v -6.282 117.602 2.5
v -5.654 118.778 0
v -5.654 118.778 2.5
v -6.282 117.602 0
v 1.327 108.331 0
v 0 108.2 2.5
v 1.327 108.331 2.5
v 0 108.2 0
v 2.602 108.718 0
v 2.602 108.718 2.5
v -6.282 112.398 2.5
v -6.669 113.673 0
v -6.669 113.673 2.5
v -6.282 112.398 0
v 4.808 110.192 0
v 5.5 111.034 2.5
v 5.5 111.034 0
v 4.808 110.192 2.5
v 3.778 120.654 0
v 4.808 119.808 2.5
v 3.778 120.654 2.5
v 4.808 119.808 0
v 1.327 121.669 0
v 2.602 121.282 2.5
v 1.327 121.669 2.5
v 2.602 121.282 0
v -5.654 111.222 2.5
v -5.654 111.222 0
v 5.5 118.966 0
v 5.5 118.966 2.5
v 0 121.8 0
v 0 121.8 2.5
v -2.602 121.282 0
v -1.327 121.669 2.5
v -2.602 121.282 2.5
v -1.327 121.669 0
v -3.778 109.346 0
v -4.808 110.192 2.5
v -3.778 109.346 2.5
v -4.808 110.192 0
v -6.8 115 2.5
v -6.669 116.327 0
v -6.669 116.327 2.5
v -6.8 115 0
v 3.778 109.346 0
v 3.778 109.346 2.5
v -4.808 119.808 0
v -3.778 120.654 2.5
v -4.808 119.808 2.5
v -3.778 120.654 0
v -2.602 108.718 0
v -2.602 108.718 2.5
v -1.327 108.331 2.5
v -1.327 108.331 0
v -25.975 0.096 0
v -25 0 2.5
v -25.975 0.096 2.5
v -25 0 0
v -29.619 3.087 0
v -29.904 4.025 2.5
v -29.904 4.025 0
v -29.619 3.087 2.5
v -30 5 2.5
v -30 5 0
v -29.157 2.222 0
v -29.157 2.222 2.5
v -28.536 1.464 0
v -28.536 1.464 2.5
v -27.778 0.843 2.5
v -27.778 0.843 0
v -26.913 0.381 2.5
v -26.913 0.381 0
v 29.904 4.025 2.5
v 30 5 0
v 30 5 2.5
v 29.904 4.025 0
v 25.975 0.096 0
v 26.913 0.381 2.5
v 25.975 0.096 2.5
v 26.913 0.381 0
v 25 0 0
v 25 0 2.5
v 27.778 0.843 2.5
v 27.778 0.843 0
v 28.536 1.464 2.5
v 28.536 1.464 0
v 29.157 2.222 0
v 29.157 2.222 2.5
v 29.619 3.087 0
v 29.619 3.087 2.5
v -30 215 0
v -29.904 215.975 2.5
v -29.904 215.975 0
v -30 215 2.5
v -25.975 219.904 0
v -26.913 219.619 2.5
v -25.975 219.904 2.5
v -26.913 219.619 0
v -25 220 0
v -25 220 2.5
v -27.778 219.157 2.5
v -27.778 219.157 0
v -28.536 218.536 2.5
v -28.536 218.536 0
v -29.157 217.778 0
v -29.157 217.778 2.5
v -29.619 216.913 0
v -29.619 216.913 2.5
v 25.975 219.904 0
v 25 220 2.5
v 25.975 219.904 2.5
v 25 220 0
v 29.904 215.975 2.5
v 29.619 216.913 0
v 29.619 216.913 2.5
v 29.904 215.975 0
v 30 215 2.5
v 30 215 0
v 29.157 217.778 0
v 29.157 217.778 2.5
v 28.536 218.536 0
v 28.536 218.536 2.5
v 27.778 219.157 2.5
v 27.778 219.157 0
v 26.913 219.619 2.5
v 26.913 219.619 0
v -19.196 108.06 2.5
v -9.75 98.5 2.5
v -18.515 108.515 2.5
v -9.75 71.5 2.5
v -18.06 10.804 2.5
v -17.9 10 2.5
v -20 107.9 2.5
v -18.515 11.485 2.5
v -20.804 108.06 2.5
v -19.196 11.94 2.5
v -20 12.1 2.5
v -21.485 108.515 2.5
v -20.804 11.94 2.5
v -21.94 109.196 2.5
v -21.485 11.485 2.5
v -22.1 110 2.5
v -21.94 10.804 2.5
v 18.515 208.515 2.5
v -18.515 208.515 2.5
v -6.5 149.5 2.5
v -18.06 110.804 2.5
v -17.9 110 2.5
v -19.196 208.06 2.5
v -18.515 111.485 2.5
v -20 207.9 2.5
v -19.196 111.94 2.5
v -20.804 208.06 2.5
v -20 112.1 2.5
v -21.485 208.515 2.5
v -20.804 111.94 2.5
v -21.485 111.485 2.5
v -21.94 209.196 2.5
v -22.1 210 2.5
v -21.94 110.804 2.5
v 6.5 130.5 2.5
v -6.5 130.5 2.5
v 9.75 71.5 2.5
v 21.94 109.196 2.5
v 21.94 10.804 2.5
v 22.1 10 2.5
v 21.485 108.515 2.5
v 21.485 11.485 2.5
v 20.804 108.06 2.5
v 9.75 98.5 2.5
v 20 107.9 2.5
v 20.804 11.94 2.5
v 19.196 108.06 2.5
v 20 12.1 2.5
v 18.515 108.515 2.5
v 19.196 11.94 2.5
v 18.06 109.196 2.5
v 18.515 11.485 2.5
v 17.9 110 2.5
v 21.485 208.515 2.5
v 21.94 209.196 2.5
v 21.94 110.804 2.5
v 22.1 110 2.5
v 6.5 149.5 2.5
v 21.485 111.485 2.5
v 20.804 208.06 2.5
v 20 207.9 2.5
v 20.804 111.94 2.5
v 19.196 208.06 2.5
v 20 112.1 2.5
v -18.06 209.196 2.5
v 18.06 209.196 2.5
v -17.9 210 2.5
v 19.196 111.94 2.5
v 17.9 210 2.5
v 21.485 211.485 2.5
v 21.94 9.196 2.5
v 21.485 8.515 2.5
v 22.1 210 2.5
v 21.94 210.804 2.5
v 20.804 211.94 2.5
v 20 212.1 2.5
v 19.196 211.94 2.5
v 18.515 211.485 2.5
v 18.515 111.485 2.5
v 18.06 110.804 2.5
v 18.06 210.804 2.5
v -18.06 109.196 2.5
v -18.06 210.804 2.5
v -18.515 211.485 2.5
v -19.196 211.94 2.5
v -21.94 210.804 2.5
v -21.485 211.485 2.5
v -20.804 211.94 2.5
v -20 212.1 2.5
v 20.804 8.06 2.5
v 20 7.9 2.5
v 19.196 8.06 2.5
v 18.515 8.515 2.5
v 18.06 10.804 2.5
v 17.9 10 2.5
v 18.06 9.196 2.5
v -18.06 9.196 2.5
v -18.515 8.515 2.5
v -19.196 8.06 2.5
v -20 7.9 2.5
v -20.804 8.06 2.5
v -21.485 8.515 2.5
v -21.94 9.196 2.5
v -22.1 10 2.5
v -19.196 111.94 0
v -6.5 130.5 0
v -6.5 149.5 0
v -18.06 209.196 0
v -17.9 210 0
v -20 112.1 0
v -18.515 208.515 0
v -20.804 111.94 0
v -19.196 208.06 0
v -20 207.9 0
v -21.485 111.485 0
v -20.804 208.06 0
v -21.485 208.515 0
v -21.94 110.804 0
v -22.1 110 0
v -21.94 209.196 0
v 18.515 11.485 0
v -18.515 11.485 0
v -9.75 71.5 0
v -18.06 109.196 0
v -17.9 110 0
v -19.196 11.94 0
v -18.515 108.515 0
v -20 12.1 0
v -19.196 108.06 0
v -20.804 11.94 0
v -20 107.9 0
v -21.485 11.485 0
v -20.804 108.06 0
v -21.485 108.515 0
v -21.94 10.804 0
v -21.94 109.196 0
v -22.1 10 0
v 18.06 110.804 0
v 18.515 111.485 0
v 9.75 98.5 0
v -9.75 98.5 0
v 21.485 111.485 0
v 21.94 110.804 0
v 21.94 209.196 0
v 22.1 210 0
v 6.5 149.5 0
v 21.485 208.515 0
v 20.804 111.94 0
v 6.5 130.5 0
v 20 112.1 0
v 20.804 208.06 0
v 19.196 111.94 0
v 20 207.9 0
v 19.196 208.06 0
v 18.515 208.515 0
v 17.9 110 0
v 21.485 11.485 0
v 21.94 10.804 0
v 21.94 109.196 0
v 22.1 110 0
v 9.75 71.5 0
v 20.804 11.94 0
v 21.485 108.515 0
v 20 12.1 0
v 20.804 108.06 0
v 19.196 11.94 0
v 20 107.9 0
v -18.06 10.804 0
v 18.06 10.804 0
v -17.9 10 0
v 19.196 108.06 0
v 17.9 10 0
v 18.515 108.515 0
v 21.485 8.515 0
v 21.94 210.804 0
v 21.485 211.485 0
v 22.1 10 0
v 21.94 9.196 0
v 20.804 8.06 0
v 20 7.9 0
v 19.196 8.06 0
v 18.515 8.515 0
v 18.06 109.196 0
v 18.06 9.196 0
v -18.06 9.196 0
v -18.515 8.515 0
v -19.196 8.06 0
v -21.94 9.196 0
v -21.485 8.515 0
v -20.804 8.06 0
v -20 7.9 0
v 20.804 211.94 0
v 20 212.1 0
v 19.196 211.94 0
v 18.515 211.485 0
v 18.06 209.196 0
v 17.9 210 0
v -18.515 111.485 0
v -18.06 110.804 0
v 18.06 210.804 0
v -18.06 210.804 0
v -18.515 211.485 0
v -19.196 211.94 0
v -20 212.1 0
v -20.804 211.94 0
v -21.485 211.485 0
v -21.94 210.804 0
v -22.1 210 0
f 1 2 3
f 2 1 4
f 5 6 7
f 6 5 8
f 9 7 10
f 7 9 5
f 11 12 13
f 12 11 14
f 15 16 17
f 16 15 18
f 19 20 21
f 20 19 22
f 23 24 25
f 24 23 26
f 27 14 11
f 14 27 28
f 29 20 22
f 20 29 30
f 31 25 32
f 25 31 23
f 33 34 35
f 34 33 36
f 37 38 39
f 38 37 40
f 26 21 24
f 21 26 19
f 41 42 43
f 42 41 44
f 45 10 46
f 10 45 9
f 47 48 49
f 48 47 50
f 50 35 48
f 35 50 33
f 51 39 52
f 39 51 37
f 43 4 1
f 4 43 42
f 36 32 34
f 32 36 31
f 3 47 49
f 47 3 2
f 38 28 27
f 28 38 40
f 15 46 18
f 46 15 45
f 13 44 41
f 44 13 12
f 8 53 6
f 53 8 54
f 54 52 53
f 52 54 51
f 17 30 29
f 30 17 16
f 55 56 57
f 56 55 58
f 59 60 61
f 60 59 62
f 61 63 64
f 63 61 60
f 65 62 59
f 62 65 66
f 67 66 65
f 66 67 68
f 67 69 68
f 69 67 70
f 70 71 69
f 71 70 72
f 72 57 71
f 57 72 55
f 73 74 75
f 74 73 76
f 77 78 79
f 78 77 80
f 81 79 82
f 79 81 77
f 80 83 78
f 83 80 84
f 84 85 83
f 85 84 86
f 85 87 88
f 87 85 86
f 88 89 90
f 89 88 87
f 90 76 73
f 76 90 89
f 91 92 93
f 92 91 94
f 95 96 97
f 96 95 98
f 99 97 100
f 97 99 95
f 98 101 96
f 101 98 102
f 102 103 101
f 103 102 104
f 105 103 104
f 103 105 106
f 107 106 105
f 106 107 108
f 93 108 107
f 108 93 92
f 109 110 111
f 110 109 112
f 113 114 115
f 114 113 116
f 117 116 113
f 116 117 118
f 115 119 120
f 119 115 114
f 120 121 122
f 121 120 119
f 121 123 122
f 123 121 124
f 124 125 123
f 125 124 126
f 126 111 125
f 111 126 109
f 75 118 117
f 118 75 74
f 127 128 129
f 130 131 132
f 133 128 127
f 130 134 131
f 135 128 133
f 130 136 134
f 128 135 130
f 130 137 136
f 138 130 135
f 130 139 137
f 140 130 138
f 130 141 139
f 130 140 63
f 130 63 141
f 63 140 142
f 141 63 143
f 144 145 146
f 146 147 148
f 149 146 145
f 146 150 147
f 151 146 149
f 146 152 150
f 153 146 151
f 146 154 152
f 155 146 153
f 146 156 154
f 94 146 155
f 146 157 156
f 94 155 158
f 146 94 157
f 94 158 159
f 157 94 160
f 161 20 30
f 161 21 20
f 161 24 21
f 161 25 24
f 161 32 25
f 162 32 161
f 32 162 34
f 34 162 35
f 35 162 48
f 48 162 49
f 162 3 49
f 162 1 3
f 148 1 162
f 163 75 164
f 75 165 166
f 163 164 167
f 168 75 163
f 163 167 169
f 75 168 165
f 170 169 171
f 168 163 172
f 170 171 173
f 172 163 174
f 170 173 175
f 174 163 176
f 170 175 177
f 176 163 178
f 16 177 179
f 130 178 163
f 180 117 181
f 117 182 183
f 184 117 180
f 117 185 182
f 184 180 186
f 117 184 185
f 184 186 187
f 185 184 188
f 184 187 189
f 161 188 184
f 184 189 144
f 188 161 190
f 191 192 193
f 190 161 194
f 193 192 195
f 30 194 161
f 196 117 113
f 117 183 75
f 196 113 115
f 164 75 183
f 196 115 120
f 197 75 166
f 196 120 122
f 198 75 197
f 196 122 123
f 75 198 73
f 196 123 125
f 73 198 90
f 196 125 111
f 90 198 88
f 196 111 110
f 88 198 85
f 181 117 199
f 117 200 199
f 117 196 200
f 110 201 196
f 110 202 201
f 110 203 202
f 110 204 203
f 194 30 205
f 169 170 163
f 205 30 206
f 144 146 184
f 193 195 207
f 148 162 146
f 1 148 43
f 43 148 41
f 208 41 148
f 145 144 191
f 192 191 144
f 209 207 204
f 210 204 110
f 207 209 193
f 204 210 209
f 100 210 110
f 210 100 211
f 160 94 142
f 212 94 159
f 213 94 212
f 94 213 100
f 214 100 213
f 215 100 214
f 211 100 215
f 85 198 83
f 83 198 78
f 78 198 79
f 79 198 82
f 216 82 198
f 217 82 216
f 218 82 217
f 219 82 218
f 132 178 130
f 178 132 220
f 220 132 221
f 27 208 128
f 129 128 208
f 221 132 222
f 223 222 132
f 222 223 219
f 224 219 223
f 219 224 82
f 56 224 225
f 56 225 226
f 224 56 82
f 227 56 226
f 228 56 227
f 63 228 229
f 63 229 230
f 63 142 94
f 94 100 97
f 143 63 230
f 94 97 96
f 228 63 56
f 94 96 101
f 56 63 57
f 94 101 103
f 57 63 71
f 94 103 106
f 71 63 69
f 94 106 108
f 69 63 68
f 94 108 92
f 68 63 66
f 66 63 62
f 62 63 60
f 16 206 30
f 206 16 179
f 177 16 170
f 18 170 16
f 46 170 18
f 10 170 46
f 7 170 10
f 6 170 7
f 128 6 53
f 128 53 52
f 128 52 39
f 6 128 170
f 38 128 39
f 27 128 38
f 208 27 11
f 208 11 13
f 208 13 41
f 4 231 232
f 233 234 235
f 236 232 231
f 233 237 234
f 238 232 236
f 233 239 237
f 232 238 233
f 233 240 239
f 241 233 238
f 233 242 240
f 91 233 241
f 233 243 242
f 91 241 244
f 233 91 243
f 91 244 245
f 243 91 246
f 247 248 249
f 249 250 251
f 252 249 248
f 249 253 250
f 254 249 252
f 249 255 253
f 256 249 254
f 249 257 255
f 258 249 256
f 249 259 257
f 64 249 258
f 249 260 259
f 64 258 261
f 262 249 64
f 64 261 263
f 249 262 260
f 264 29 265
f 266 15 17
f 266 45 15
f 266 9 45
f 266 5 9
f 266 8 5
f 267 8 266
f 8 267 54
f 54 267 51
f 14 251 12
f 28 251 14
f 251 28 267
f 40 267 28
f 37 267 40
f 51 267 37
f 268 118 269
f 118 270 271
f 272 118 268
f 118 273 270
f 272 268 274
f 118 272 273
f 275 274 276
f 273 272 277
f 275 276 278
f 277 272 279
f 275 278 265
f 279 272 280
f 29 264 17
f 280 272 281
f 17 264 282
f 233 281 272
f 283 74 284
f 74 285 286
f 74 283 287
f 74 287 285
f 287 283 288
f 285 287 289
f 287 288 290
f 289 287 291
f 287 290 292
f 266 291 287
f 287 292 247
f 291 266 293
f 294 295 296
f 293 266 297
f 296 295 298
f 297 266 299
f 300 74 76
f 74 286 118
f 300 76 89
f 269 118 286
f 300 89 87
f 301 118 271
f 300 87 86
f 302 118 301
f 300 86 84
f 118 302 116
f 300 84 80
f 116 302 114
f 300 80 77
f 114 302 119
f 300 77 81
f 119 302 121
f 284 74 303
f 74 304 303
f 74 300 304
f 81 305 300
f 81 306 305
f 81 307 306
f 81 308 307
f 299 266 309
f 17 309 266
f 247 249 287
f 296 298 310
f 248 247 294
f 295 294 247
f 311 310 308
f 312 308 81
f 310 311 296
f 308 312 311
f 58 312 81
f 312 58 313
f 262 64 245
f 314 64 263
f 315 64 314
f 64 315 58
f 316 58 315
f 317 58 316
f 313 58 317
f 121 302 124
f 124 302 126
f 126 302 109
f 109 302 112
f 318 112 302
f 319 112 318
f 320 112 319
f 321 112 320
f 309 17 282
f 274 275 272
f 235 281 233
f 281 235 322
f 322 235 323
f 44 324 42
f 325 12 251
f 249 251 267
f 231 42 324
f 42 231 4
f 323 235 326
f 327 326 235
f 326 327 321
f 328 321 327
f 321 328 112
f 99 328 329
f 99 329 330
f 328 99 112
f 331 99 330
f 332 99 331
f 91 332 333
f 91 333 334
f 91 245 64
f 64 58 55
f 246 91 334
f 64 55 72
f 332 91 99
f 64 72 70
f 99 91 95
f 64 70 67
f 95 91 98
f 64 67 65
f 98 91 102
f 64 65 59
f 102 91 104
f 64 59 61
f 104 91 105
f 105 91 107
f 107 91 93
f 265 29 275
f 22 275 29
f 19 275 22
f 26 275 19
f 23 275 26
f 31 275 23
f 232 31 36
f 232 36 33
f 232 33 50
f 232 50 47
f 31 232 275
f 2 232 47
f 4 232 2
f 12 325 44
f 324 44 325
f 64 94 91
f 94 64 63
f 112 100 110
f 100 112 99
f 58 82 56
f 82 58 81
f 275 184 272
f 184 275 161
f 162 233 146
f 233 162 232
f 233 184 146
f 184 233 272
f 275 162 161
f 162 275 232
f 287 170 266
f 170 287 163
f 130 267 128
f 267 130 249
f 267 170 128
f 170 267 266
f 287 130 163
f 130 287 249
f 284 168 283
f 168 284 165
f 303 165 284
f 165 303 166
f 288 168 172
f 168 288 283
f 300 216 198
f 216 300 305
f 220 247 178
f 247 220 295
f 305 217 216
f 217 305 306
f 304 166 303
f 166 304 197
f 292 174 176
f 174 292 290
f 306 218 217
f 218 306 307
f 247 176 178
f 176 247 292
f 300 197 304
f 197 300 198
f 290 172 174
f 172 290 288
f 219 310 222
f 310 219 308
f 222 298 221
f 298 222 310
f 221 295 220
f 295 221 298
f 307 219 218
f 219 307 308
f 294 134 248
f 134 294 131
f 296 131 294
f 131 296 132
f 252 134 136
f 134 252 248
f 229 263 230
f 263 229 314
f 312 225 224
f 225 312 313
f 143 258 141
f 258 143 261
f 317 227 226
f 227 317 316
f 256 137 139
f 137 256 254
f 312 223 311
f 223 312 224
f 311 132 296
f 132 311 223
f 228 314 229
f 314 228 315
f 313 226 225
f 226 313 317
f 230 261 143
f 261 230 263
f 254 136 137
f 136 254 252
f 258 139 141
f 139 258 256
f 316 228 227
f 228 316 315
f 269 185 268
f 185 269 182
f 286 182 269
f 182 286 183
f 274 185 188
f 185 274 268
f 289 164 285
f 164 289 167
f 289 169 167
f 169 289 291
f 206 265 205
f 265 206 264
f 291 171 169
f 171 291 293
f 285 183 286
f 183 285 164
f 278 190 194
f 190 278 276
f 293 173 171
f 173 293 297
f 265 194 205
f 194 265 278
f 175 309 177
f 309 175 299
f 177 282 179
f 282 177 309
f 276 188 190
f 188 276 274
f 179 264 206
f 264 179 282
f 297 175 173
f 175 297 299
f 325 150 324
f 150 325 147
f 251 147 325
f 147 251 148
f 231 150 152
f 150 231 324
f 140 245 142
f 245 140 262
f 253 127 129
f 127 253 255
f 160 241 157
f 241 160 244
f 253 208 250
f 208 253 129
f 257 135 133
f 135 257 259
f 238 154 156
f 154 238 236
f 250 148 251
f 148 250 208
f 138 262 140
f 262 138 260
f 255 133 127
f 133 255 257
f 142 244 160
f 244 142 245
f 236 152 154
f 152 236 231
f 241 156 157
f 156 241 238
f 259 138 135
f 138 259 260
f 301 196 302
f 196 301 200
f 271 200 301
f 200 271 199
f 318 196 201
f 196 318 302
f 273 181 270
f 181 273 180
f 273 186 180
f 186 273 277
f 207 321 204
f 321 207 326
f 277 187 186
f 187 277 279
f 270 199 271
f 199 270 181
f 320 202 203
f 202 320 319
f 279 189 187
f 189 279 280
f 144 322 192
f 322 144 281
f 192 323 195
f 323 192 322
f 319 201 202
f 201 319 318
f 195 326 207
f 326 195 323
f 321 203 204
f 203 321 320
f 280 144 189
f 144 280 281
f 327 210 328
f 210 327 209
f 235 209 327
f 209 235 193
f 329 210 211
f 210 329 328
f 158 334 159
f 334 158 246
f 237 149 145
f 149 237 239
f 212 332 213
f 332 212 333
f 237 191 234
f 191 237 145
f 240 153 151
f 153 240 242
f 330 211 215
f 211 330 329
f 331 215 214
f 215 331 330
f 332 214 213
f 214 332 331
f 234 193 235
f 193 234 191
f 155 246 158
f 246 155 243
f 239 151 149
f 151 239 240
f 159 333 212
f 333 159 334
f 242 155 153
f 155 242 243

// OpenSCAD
length=220;
height=60;
thickness=2.5;
round=5;
m4ClearRad=2.1;
overlap=0.1;

module fuseCutout() {
	translate([0,0,-overlap])
		difference() {
			cylinder(r=6.8,h=thickness+2*overlap,$fn=32);
			translate([5.5,-10,-overlap]) cube([20,20,thickness+4*overlap]);
		}
}

module switchCutout() {
	union() {
		cube([13,19,10], center=true);
	}
}

module inletCutout() {
	union() {
		cube([19.5,27,10], center=true);
	}
}

module roundCorner(radius, height) {
	difference() {
		cube([radius+2,radius+2,height]);
		translate([0,0,-overlap]) cylinder(r=radius,h=height+2*overlap,$fn=32);
	}
}

difference() {
	translate([-height/2,0,0]) cube([height,length,2.5]);
	translate([0,115,0]) fuseCutout();
	translate([0,140,0]) switchCutout();
	translate([0,85,0]) inletCutout();

	// Screw holes
	translate([20,10,-overlap]) cylinder(r=m4ClearRad,h=thickness+2*overlap, $fn=16);
	translate([-20,10,-overlap]) cylinder(r=m4ClearRad,h=thickness+2*overlap, $fn=16);
	translate([20,length/2,-overlap]) cylinder(r=m4ClearRad,h=thickness+2*overlap, $fn=16);
	translate([-20,length/2,-overlap]) cylinder(r=m4ClearRad,h=thickness+2*overlap, $fn=16);
	translate([20,length-10,-overlap]) cylinder(r=m4ClearRad,h=thickness+2*overlap, $fn=16);
	translate([-20,length-10,-overlap]) cylinder(r=m4ClearRad,h=thickness+2*overlap, $fn=16);

	// Corners
	translate([-height/2+round,round,-overlap])
		rotate([0,0,180]) roundCorner(round,thickness+2*overlap);
	translate([height/2-round,round,-overlap])
		rotate([0,0,-90]) roundCorner(round,thickness+2*overlap);
	translate([-height/2+round,length-round,-overlap])
		rotate([0,0,90]) roundCorner(round,thickness+2*overlap);
	translate([height/2-round,length-round,-overlap])
		rotate([0,0,0]) roundCorner(round,thickness+2*overlap);
}
